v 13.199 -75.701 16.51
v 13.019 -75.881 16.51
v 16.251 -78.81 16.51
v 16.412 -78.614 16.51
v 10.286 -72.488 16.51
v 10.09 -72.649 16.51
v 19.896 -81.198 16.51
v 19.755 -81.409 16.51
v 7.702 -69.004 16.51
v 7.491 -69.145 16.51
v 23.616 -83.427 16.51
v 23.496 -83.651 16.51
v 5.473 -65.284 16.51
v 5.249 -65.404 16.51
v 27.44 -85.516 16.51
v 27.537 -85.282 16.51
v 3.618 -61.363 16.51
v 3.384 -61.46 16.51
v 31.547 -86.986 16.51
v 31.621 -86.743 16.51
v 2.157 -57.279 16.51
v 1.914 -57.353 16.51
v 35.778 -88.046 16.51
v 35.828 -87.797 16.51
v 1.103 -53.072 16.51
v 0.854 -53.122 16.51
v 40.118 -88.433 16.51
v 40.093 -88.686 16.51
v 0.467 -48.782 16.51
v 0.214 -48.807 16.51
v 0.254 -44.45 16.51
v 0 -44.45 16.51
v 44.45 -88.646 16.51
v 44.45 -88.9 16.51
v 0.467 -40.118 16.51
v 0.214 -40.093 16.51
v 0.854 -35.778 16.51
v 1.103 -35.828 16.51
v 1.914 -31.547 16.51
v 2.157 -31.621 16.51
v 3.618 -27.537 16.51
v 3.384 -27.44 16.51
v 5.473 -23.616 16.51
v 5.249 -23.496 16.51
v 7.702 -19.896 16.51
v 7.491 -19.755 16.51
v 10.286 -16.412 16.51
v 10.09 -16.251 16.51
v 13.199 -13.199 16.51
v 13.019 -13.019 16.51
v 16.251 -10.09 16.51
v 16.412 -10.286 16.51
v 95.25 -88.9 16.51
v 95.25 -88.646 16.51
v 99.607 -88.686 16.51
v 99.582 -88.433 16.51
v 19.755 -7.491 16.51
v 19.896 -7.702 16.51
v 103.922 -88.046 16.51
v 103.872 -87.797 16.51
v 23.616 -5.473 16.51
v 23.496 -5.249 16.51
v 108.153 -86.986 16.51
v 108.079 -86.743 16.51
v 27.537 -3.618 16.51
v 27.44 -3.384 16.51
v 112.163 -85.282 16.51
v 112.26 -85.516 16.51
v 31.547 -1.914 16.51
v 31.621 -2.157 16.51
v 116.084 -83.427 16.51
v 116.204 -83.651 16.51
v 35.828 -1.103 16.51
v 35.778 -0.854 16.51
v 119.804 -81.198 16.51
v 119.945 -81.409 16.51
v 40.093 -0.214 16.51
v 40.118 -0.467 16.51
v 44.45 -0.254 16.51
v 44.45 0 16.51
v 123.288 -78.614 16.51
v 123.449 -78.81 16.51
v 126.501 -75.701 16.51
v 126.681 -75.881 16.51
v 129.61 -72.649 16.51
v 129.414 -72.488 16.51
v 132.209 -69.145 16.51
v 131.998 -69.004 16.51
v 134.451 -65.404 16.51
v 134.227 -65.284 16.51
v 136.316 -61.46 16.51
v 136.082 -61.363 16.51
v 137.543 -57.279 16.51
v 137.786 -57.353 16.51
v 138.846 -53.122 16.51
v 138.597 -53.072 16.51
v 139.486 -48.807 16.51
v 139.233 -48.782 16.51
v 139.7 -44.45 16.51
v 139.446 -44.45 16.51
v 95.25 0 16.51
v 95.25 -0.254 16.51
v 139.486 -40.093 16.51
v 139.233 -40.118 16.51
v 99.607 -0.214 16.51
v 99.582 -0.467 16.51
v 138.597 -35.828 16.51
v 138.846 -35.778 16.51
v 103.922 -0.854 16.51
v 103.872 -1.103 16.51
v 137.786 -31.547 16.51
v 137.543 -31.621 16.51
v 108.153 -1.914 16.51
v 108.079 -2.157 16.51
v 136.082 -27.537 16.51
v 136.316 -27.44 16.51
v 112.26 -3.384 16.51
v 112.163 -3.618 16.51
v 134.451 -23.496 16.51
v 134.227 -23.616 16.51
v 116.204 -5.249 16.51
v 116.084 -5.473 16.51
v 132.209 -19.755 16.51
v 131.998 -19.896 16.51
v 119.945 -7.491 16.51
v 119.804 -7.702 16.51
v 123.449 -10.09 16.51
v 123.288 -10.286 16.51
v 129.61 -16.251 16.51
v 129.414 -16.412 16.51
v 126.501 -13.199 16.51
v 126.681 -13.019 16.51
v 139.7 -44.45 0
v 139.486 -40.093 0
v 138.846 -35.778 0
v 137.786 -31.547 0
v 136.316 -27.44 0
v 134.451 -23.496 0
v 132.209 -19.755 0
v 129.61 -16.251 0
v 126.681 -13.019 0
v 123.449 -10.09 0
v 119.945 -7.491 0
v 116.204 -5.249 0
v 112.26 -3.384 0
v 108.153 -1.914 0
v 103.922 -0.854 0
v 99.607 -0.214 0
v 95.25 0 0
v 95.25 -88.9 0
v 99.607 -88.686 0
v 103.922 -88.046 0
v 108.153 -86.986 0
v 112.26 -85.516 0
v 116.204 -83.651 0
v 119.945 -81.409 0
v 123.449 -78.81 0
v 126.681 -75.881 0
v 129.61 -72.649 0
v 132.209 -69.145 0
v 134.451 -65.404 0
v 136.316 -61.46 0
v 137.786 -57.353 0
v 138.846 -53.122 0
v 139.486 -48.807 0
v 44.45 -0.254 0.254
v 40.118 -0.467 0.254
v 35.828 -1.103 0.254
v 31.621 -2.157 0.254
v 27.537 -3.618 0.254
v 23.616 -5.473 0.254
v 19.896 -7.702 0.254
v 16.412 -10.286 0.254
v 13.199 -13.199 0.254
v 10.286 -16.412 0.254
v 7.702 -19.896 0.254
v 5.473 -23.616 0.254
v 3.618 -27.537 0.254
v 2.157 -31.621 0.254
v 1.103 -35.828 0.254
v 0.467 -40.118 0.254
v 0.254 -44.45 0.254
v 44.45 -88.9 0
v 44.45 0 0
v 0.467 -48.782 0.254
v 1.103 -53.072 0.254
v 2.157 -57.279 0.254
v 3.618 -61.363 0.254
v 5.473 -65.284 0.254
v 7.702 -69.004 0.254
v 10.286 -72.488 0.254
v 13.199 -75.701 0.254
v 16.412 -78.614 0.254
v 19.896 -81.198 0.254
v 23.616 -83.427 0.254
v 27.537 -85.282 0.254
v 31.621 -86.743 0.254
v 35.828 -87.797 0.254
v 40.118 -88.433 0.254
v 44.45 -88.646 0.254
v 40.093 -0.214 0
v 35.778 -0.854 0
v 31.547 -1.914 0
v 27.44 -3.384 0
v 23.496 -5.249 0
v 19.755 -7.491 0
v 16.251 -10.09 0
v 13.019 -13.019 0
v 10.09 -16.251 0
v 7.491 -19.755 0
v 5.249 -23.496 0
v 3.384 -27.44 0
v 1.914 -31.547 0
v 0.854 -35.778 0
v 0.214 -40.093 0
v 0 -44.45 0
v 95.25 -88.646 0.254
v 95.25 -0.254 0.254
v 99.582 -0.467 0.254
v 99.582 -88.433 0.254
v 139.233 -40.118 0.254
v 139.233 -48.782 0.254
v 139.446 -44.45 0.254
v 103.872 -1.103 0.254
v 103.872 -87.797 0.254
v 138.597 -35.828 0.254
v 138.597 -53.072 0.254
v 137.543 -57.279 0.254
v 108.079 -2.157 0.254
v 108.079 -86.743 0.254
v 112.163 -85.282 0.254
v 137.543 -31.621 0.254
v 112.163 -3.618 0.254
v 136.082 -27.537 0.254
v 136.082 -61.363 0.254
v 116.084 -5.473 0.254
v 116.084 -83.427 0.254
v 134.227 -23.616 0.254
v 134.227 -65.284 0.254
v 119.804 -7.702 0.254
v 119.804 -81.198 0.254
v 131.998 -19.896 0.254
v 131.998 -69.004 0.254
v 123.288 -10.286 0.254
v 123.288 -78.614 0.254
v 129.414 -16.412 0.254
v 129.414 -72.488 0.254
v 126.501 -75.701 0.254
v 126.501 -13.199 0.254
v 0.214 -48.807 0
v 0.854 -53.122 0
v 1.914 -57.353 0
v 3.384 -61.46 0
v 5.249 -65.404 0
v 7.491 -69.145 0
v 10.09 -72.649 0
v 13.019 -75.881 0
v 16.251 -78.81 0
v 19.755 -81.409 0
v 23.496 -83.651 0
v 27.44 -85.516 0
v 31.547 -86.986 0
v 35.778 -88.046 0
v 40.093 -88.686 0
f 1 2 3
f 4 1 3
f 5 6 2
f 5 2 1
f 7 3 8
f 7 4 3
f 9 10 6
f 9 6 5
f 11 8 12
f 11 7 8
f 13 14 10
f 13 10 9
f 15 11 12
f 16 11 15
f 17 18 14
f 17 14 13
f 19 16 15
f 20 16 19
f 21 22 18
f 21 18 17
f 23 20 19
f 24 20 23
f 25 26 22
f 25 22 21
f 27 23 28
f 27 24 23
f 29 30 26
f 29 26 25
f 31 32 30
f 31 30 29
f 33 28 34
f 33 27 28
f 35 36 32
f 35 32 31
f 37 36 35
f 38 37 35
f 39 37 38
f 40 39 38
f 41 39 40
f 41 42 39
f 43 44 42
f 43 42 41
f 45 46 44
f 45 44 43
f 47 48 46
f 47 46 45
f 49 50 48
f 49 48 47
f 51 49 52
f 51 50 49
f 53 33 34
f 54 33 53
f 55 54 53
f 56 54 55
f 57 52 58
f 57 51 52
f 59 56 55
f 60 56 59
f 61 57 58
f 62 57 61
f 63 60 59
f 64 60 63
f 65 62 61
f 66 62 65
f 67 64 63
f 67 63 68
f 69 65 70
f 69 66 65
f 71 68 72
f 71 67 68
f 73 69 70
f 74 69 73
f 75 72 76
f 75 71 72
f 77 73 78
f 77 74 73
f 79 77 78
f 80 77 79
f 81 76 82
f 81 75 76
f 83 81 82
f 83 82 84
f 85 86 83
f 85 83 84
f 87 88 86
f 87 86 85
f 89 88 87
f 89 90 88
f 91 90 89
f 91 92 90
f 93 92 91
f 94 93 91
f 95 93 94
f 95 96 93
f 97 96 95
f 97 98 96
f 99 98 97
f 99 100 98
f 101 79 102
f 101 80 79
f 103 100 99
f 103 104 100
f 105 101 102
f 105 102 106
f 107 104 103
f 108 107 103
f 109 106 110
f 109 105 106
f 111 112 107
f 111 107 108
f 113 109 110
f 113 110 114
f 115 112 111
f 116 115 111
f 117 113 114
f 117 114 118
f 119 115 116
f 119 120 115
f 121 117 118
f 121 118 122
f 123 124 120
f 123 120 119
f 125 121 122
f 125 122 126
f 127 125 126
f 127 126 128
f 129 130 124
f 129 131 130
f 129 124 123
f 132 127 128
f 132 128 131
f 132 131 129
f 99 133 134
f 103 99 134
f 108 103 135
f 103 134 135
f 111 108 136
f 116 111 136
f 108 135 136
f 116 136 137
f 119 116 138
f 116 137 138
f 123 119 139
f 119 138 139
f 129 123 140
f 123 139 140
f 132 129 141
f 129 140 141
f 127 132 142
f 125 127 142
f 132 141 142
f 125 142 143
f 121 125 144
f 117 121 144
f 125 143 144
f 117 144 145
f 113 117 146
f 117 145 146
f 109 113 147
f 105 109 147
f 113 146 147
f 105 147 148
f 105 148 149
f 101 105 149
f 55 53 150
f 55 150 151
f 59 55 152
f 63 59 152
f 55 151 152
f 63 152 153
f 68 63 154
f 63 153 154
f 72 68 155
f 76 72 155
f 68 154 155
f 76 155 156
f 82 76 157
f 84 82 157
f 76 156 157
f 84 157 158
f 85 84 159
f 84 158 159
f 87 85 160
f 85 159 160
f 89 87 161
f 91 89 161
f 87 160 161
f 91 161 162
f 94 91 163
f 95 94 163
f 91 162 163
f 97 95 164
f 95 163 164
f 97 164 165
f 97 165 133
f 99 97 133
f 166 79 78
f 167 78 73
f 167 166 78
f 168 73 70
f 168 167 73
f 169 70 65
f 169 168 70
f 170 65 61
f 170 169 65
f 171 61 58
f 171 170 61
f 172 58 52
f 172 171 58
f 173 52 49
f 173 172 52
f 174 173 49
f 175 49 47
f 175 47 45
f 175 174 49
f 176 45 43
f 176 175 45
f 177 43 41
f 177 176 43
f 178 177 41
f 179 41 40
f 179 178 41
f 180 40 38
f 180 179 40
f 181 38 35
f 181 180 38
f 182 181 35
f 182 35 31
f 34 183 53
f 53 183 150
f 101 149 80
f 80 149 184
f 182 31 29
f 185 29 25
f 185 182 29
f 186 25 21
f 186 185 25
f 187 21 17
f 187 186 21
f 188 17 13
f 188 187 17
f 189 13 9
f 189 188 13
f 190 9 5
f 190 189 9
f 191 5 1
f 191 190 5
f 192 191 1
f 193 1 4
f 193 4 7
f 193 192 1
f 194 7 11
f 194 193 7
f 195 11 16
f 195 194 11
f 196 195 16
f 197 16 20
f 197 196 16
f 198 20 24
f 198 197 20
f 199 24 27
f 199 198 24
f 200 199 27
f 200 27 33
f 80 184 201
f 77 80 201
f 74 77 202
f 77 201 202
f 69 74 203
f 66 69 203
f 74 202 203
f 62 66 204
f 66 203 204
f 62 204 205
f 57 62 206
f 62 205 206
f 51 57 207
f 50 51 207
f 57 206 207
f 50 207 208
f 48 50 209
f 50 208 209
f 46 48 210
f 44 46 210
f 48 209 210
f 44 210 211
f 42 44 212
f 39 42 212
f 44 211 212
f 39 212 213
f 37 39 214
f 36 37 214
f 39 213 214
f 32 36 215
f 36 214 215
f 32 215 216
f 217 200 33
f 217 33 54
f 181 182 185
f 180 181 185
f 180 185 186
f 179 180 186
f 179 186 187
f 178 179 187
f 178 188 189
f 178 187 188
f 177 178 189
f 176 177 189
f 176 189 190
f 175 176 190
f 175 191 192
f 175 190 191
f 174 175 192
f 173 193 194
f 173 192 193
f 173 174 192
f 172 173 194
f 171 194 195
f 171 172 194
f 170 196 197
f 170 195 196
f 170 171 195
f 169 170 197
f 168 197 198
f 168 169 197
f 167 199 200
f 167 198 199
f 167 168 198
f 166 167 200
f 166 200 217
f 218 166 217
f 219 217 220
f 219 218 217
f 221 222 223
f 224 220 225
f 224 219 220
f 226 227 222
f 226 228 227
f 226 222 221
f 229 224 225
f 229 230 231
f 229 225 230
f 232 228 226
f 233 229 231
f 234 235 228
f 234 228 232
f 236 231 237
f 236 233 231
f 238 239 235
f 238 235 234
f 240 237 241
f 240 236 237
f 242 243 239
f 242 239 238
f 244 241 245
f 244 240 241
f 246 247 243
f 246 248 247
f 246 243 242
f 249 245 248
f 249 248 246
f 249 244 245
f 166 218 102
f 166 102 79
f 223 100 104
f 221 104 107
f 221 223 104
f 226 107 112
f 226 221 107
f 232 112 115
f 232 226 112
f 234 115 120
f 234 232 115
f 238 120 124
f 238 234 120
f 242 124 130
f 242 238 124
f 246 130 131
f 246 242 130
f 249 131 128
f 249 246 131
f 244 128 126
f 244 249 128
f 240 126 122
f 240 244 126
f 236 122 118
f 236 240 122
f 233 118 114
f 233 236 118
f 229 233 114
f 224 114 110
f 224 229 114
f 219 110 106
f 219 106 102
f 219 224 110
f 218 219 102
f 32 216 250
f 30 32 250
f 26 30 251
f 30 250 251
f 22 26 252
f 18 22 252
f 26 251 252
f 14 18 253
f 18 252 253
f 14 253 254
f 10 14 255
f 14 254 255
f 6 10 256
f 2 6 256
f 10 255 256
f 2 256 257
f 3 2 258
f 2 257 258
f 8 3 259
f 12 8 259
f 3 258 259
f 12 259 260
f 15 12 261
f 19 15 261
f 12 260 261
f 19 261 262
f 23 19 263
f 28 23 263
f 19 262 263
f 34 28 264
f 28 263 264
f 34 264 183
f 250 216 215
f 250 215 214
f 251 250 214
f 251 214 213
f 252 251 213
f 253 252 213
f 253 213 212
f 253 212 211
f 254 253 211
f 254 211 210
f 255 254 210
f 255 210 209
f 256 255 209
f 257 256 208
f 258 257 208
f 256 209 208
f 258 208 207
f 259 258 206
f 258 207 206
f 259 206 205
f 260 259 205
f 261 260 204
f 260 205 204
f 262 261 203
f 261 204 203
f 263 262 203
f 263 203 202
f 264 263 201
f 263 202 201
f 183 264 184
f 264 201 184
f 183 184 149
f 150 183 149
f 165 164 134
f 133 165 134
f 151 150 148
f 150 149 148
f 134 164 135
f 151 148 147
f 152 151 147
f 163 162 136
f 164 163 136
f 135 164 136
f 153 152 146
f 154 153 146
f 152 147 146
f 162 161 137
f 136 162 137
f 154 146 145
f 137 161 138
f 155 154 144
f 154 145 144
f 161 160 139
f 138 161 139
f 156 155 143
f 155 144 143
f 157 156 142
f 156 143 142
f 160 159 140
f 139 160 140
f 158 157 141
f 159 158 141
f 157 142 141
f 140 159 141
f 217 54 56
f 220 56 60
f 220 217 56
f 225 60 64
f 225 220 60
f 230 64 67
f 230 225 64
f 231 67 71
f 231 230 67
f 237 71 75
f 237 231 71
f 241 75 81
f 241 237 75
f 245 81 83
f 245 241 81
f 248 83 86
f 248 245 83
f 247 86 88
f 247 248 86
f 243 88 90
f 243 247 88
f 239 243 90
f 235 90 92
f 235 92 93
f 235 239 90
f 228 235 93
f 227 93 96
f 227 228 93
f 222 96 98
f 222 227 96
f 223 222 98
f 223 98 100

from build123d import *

# Parameters (mm, degrees)
F1_DEPTH = 16.51
F2_T     = -0.254


with BuildPart() as f1:
    # F0 (on Top) → F1 (new body)
    with BuildSketch(Plane.XY):
        with BuildLine():
            Line((95.25, 0), (44.45, 0))
            ThreePointArc((44.45, 0), (13.019104, -13.019104), (0, -44.45))
            ThreePointArc((0, -44.45), (13.019104, -75.880896), (44.45, -88.9))
            Line((44.45, -88.9), (95.25, -88.9))
            ThreePointArc((95.25, -88.9), (126.680896, -75.880896), (139.7, -44.45))
            ThreePointArc((139.7, -44.45), (126.680896, -13.019104), (95.25, 0))
        make_face()
    extrude(amount=F1_DEPTH)

    # F2
    f2_openings = [f1.faces().sort_by_distance(p)[0] for p in [
        (69.85, -44.45, 16.51),
    ]]
    offset(amount=F2_T, openings=f2_openings)


solid = f1.part
